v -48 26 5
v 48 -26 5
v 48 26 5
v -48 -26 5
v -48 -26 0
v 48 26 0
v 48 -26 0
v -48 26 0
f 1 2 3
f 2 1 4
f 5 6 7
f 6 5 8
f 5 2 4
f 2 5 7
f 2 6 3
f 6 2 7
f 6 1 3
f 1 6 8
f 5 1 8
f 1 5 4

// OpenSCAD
// Coordinate reference for task-029:
// plate x=[-48,48], y=[-26,26], z=[0,5] mm.
plate_size = [96, 52, 5];
plate_origin = [-48, -26, 0];

translate(plate_origin) cube(plate_size);
